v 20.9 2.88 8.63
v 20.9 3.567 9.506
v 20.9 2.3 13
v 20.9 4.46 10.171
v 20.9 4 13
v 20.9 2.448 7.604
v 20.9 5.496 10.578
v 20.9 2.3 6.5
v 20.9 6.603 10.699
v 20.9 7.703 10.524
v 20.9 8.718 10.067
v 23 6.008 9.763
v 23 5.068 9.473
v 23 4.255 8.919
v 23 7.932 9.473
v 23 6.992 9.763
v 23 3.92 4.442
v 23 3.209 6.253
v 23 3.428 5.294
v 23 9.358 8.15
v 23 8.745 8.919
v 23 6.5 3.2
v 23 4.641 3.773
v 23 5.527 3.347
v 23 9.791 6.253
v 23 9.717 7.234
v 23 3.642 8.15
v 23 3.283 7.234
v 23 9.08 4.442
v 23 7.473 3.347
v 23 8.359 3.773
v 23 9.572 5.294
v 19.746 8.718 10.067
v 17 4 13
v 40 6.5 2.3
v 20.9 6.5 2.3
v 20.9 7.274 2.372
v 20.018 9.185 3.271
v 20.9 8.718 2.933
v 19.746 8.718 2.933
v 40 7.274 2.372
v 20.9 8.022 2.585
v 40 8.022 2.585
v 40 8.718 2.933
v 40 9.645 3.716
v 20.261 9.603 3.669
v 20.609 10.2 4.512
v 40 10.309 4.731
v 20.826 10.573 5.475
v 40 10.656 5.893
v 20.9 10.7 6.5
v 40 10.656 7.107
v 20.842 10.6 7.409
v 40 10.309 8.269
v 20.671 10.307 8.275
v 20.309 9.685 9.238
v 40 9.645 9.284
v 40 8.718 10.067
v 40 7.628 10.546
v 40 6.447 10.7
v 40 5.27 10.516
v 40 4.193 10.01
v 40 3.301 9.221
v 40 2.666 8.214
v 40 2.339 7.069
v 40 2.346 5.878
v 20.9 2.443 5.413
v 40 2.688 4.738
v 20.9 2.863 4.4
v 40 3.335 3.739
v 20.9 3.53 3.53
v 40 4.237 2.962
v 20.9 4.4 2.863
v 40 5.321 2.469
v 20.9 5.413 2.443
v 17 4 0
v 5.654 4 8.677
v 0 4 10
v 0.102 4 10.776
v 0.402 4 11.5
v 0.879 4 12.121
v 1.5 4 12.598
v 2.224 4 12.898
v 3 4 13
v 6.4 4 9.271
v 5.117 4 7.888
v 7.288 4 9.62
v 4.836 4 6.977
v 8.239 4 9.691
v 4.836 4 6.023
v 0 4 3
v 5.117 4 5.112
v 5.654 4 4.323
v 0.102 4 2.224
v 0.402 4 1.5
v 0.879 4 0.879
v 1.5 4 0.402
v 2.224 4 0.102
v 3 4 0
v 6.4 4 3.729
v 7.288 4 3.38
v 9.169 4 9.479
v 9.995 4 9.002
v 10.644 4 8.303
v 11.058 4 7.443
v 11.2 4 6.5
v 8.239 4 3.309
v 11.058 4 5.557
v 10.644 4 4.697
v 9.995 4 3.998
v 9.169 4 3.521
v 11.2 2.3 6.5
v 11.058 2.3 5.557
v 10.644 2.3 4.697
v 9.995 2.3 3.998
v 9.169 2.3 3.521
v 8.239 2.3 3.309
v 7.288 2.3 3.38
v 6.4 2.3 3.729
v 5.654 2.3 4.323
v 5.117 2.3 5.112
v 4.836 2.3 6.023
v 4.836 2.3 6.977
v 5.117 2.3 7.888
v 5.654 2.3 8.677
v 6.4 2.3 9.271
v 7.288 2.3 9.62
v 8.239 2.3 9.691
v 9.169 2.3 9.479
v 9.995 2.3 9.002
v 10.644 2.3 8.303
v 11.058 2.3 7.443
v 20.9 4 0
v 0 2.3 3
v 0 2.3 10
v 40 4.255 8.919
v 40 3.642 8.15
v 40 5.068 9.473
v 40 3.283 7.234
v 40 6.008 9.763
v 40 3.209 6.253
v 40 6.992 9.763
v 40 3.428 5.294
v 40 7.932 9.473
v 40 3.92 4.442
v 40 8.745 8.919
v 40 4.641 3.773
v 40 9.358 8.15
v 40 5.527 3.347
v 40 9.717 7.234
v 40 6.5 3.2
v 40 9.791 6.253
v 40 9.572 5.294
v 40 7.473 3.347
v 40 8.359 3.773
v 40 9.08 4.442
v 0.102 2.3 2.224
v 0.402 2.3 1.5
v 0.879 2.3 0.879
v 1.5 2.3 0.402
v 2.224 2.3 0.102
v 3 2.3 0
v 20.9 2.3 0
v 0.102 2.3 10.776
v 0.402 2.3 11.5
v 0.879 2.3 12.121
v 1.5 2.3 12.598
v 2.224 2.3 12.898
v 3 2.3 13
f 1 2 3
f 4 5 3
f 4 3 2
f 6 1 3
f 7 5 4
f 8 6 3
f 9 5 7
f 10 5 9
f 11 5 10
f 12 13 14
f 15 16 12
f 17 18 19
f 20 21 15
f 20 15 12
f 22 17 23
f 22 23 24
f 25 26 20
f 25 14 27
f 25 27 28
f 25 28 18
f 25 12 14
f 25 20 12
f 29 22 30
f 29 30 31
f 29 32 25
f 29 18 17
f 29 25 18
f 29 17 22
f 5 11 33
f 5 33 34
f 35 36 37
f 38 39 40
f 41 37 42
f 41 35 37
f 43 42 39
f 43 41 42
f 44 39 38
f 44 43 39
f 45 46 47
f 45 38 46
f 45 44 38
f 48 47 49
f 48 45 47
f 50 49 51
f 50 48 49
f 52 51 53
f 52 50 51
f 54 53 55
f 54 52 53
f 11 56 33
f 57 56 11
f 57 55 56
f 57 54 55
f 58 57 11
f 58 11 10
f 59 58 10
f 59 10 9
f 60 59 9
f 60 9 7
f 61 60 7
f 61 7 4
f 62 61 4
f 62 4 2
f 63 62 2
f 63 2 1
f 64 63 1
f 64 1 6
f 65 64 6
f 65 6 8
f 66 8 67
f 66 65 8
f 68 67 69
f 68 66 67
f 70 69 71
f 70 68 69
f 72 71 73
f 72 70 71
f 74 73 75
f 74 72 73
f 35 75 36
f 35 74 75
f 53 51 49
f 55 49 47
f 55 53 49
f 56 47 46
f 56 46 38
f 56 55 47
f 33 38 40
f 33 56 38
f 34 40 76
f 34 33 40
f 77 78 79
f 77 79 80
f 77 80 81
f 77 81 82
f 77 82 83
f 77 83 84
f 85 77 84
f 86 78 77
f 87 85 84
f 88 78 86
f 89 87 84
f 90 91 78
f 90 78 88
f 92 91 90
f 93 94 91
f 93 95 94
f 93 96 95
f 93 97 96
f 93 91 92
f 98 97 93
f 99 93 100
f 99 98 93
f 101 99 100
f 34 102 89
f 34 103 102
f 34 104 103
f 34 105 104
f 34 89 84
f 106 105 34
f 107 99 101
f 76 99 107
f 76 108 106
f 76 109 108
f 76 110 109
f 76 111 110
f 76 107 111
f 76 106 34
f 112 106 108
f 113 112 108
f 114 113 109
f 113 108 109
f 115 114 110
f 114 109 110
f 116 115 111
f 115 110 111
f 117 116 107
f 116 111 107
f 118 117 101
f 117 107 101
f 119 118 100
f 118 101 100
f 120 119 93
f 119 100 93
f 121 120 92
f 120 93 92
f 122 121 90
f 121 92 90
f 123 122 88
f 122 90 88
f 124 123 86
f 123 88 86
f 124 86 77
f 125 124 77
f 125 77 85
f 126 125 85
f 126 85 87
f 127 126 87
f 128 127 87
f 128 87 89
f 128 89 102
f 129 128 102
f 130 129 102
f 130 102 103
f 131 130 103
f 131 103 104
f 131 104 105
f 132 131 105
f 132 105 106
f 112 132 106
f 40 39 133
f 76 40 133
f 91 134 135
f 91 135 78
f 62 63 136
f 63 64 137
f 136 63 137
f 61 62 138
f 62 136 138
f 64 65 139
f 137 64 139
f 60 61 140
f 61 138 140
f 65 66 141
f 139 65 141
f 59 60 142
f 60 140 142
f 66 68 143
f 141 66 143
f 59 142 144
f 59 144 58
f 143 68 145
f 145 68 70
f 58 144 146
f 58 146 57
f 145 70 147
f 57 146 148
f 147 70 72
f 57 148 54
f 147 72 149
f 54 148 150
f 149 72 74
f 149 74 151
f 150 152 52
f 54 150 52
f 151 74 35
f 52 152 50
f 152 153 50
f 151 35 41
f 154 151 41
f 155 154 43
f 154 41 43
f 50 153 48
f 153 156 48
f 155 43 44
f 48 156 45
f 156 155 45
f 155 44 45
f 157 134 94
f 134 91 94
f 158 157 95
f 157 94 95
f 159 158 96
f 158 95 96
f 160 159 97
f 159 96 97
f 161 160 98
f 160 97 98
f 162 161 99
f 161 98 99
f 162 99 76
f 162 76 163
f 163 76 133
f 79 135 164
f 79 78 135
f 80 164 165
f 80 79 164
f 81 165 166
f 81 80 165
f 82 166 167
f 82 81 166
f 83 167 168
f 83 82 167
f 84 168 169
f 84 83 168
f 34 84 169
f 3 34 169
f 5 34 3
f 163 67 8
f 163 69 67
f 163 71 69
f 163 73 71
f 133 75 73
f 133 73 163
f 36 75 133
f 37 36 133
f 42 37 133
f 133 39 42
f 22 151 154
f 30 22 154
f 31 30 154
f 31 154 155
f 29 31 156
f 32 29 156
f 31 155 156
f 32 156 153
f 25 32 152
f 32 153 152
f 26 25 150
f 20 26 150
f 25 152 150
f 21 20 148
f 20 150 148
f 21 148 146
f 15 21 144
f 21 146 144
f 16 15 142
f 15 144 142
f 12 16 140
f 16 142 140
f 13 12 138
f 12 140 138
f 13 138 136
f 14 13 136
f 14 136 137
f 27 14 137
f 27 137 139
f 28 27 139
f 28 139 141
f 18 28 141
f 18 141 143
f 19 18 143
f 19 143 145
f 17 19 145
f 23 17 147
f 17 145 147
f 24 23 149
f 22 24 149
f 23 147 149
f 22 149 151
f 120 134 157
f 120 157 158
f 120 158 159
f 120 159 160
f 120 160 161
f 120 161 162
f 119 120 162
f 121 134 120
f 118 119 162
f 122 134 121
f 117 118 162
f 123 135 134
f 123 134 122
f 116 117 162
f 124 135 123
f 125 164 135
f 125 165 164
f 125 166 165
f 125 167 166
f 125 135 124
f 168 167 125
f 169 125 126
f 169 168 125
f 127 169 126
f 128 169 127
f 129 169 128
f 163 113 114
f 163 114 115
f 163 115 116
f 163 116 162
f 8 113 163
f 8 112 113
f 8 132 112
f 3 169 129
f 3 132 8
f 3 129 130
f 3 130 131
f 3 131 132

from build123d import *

# Parameters (mm, degrees)
CROQUIS1_W              = 40
CROQUIS1_H              = 13
SALIENTE_EXTRUIR1_DEPTH = 13
CROQUIS2_R              = 3.3
CORTAR_EXTRUIR1_DEPTH   = 17
CROQUIS3_R              = 3.2
CORTAR_EXTRUIR4_DEPTH   = 19
CROQUIS7_W              = 17
CROQUIS7_H              = 13
CORTAR_EXTRUIR5_DEPTH   = 9
CROQUIS8_OUTSIDE_W      = 23.804
CROQUIS8_OUTSIDE_H      = 23.804
CROQUIS8_OUTSIDE_R      = 4.2
CORTAR_EXTRUIR6_DEPTH   = 19.1
CROQUIS9_W              = 3.9
CROQUIS9_H              = 13
CORTAR_EXTRUIR7_DEPTH   = 2.3
CROQUIS10_W             = 20.9
CROQUIS10_H             = 13
CORTAR_EXTRUIR8_DEPTH   = 2.3
CORTAR_EXTRUIR9_DEPTH   = 22.3
CORTAR_EXTRUIR10_DEPTH  = 22.3
CORTAR_EXTRUIR11_DEPTH  = 22.3
CORTAR_EXTRUIR12_DEPTH  = 32.3
REDONDEO1_R             = 3


with BuildPart() as part:
    # Croquis1 → Saliente-Extruir1 (new body)
    with BuildSketch(Plane.XY):
        with Locations((20, 6.5)):
            Rectangle(CROQUIS1_W, CROQUIS1_H)
    extrude(amount=SALIENTE_EXTRUIR1_DEPTH)

    # Croquis2 → Cortar-Extruir1 (cut)
    with BuildSketch(Plane(origin=(40, 0, 0), x_dir=(0, 0, -1), z_dir=(1, 0, 0))):
        with Locations((-6.5, 6.5)):
            Circle(CROQUIS2_R)
    extrude(amount=-CORTAR_EXTRUIR1_DEPTH, mode=Mode.SUBTRACT)

    # Croquis3 → Cortar-Extruir4 (cut)
    with BuildSketch(Plane(origin=(0, 13, 0), x_dir=(1, 0, 0), z_dir=(0, 1, 0))):
        with Locations((8, -6.5)):
            Circle(CROQUIS3_R)
    extrude(amount=-CORTAR_EXTRUIR4_DEPTH, mode=Mode.SUBTRACT)

    # Croquis7 → Cortar-Extruir5 (cut)
    with BuildSketch(Plane(origin=(0, 13, 0), x_dir=(1, 0, 0), z_dir=(0, 1, 0))):
        with Locations((8.5, -6.5)):
            Rectangle(CROQUIS7_W, CROQUIS7_H)
    extrude(amount=-CORTAR_EXTRUIR5_DEPTH, mode=Mode.SUBTRACT)

    # Croquis8 outside → Cortar-Extruir6 (cut)
    with BuildSketch(Plane(origin=(40, 0, 0), x_dir=(0, 0, -1), z_dir=(1, 0, 0))):
        with Locations((-6.5, 6.5)):
            Rectangle(CROQUIS8_OUTSIDE_W, CROQUIS8_OUTSIDE_H)
        with Locations((-6.5, 6.5)):
            Circle(CROQUIS8_OUTSIDE_R, mode=Mode.SUBTRACT)
    extrude(amount=-CORTAR_EXTRUIR6_DEPTH, mode=Mode.SUBTRACT)

    # Croquis9 → Cortar-Extruir7 (cut)
    with BuildSketch(Plane(origin=(0, 13, 0), x_dir=(1, 0, 0), z_dir=(0, 1, 0))):
        with Locations((18.95, -6.5)):
            Rectangle(CROQUIS9_W, CROQUIS9_H)
    extrude(amount=-CORTAR_EXTRUIR7_DEPTH, mode=Mode.SUBTRACT)

    # Croquis10 → Cortar-Extruir8 (cut)
    with BuildSketch(Plane.XZ):
        with Locations((10.45, 6.5)):
            Rectangle(CROQUIS10_W, CROQUIS10_H)
    extrude(amount=-CORTAR_EXTRUIR8_DEPTH, mode=Mode.SUBTRACT)

    # Croquis11 → Cortar-Extruir9 (cut)
    with BuildSketch(Plane.XY.offset(13)):
        Polygon((17, 4), (17, 10.7), (20.9, 10.7), align=None)
    extrude(amount=-CORTAR_EXTRUIR9_DEPTH, mode=Mode.SUBTRACT)

    # Croquis13 → Cortar-Extruir10 (cut)
    with BuildSketch(Plane(origin=(20.9, 0, 0), x_dir=(0, 0, -1), z_dir=(1, 0, 0))):
        Polygon((-13, 4), (-13, 10.7), (-8.834314401, 10.7), align=None)
    extrude(amount=-CORTAR_EXTRUIR10_DEPTH, mode=Mode.SUBTRACT)

    # Croquis14 → Cortar-Extruir11 (cut)
    with BuildSketch(Plane(origin=(20.9, 0, 0), x_dir=(0, 0, -1), z_dir=(1, 0, 0))):
        Polygon((0, 4), (0, 10.7), (-4.165524435, 10.7), align=None)
    extrude(amount=-CORTAR_EXTRUIR11_DEPTH, mode=Mode.SUBTRACT)

    # Croquis15 → Cortar-Extruir12 (cut)
    with BuildSketch(Plane(origin=(40, 0, 0), x_dir=(0, 0, -1), z_dir=(1, 0, 0))):
        with BuildLine():
            Line((-10.06680245, 8.717638448), (-11.135301445, 9.381971415))
            ThreePointArc((-11.135301445, 9.381971415), (-6.499952655, 11.958184563), (-1.864648558, 9.381891))
            Line((-1.864648558, 9.381891), (-2.933159079, 8.717576569))
            ThreePointArc((-2.933159079, 8.717576569), (-6.499963568, 10.7), (-10.06680245, 8.717638448))
        make_face()
    extrude(amount=-CORTAR_EXTRUIR12_DEPTH, mode=Mode.SUBTRACT)

    # Redondeo1
    redondeo1_edges = [part.edges().sort_by_distance(p)[0] for p in [
        (0, 3.15, 0),
        (0, 3.15, 13),
    ]]
    fillet(redondeo1_edges, radius=REDONDEO1_R)


solid = part.part
